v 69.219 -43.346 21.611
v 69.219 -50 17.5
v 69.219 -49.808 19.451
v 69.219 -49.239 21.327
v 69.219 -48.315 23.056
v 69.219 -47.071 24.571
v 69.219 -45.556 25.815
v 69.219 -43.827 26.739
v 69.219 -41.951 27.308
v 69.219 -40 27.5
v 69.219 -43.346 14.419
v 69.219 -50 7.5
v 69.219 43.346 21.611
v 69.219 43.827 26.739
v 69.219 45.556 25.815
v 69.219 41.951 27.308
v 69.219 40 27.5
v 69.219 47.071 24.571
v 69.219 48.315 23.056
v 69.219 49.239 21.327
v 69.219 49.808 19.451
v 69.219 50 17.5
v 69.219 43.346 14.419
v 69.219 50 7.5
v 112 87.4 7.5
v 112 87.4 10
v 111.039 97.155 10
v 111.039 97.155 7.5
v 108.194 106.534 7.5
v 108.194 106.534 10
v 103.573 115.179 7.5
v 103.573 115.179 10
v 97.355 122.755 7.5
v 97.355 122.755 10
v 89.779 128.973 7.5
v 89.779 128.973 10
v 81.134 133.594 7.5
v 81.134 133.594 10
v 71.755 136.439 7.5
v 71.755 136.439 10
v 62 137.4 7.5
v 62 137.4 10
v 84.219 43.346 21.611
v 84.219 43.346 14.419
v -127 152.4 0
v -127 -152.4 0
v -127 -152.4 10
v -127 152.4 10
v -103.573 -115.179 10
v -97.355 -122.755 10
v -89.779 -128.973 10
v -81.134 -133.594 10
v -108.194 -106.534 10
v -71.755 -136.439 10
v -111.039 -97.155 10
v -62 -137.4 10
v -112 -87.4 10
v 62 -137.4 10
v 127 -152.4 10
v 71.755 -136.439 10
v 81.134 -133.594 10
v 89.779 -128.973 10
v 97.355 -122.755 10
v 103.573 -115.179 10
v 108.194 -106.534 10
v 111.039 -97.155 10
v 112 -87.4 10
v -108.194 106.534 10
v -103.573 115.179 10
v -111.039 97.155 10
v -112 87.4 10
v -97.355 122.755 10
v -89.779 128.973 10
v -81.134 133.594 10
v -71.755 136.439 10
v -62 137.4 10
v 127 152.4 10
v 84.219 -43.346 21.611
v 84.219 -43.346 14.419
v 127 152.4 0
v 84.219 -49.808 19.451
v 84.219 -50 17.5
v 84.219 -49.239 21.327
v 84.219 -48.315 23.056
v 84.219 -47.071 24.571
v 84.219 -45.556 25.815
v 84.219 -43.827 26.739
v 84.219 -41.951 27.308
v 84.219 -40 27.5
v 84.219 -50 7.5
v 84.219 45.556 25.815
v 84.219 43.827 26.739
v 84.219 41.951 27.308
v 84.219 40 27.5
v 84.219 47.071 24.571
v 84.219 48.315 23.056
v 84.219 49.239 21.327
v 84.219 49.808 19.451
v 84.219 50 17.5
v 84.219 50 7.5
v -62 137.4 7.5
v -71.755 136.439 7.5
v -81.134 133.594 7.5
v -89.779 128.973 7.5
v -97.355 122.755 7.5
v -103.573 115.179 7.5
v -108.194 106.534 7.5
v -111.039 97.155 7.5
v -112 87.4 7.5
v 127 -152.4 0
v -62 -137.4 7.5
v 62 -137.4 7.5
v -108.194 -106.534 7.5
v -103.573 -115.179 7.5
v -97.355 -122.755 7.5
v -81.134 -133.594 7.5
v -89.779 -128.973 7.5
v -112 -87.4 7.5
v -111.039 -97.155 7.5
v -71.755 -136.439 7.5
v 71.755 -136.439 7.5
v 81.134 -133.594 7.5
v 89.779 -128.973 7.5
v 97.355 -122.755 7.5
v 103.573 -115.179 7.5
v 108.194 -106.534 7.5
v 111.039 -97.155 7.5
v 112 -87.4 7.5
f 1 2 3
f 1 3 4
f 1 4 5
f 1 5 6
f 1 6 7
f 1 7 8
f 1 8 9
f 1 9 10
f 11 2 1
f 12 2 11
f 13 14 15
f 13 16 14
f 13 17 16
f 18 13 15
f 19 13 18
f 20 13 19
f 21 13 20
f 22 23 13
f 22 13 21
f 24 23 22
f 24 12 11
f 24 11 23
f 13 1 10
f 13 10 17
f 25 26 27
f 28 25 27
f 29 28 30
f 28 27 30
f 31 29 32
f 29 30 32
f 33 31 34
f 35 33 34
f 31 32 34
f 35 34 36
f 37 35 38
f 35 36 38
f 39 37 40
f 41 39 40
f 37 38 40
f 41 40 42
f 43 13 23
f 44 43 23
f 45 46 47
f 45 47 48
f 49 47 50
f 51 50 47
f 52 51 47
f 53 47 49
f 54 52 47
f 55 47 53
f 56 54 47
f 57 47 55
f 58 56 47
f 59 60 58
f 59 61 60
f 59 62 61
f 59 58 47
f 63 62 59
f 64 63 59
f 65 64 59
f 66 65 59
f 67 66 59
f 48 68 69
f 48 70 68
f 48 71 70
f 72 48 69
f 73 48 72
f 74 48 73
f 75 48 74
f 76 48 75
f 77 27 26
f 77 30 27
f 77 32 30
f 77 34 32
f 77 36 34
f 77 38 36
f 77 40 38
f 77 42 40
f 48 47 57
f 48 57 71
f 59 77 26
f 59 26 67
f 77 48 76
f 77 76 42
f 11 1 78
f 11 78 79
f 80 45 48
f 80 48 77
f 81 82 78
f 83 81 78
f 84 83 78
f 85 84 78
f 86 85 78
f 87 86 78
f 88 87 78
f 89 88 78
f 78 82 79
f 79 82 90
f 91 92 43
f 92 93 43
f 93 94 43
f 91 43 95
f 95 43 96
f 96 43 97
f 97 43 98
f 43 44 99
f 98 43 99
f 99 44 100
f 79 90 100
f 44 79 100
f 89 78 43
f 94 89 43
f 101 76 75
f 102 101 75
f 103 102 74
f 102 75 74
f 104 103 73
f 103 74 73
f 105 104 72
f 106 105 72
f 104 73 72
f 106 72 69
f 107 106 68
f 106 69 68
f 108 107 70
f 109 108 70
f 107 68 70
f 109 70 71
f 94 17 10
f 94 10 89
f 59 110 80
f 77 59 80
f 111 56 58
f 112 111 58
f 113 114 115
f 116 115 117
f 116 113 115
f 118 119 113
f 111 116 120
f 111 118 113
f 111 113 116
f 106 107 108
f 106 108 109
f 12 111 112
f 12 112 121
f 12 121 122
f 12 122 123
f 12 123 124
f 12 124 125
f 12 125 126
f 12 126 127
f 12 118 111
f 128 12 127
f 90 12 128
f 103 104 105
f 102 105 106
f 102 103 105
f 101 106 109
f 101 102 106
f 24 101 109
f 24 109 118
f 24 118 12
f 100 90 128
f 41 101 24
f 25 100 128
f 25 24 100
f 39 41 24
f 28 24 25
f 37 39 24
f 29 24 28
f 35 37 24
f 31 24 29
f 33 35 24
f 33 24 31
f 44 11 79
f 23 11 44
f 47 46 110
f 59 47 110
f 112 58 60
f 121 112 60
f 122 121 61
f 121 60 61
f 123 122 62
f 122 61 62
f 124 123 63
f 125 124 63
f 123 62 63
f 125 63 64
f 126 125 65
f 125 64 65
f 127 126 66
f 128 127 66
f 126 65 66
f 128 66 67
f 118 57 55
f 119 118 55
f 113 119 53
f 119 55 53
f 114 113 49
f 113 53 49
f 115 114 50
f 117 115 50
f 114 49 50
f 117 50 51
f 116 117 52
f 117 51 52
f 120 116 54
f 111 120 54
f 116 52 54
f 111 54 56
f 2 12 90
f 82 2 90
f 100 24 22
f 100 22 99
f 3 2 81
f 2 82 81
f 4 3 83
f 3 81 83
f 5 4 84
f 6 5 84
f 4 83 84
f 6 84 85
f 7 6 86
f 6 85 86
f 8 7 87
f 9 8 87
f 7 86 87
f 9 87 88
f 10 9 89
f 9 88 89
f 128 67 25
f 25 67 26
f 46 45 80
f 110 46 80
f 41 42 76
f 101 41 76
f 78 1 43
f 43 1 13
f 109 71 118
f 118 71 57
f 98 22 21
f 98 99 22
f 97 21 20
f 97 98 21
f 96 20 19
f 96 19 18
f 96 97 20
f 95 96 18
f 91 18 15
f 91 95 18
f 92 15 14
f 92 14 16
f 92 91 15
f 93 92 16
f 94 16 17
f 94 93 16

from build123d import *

# Parameters (mm, degrees)
SKETCH1_W               = 254
SKETCH1_H               = 304.8
BOSS_EXTRUDE1_DEPTH     = 10
CUT_EXTRUDE1_DEPTH      = 2.5
SKETCH3_W               = 15
SKETCH3_H               = 100
BOSS_EXTRUDE2_DEPTH     = 20
CUT_EXTRUDE4_DEPTH      = 262.907148317
CUT_EXTRUDE4_DEPTH_BACK = 262.907148317
SKETCH4_W               = 7.192307822
SKETCH4_H               = 86.692915772
FILLET2_R               = 10


with BuildPart() as part:
    # Sketch1 → Boss-Extrude1 (new body)
    with BuildSketch(Plane.XY):
        Rectangle(SKETCH1_W, SKETCH1_H)
    extrude(amount=BOSS_EXTRUDE1_DEPTH)

    # Sketch2 → Cut-Extrude1 (cut)
    with BuildSketch(Plane.XY.offset(10)):
        with BuildLine():
            Line((-62, -137.4), (62, -137.4))
            ThreePointArc((62, -137.4), (97.355339059, -122.755339059), (112, -87.4))
            Line((112, -87.4), (112, 87.4))
            ThreePointArc((112, 87.4), (97.355339059, 122.755339059), (62, 137.4))
            Line((62, 137.4), (-62, 137.4))
            ThreePointArc((-62, 137.4), (-97.355339059, 122.755339059), (-112, 87.4))
            Line((-112, 87.4), (-112, -87.4))
            ThreePointArc((-112, -87.4), (-97.355339059, -122.755339059), (-62, -137.4))
        make_face()
    extrude(amount=-CUT_EXTRUDE1_DEPTH, mode=Mode.SUBTRACT)

    # Sketch3 → Boss-Extrude2 (add)
    with BuildSketch(Plane.XY.offset(7.5)):
        with Locations((76.718712096, 0)):
            Rectangle(SKETCH3_W, SKETCH3_H)
    extrude(amount=BOSS_EXTRUDE2_DEPTH)

    # Sketch4 → Cut-Extrude4 (cut, two sides: drawn at the far end of the back side and taken through both)
    with BuildSketch(Plane(origin=(84.218712096, 0, 0), x_dir=(0, 0, -1), z_dir=(1, 0, 0)).offset(-CUT_EXTRUDE4_DEPTH_BACK)):
        with Locations((-18.014845045, 0)):
            Rectangle(SKETCH4_W, SKETCH4_H)
    extrude(amount=CUT_EXTRUDE4_DEPTH + CUT_EXTRUDE4_DEPTH_BACK, mode=Mode.SUBTRACT)

    # Fillet2
    fillet2_edges = [part.edges().sort_by_distance(p)[0] for p in [
        (76.718712096, 50, 27.5),
        (76.718712096, -50, 27.5),
    ]]
    fillet(fillet2_edges, radius=FILLET2_R)


solid = part.part
